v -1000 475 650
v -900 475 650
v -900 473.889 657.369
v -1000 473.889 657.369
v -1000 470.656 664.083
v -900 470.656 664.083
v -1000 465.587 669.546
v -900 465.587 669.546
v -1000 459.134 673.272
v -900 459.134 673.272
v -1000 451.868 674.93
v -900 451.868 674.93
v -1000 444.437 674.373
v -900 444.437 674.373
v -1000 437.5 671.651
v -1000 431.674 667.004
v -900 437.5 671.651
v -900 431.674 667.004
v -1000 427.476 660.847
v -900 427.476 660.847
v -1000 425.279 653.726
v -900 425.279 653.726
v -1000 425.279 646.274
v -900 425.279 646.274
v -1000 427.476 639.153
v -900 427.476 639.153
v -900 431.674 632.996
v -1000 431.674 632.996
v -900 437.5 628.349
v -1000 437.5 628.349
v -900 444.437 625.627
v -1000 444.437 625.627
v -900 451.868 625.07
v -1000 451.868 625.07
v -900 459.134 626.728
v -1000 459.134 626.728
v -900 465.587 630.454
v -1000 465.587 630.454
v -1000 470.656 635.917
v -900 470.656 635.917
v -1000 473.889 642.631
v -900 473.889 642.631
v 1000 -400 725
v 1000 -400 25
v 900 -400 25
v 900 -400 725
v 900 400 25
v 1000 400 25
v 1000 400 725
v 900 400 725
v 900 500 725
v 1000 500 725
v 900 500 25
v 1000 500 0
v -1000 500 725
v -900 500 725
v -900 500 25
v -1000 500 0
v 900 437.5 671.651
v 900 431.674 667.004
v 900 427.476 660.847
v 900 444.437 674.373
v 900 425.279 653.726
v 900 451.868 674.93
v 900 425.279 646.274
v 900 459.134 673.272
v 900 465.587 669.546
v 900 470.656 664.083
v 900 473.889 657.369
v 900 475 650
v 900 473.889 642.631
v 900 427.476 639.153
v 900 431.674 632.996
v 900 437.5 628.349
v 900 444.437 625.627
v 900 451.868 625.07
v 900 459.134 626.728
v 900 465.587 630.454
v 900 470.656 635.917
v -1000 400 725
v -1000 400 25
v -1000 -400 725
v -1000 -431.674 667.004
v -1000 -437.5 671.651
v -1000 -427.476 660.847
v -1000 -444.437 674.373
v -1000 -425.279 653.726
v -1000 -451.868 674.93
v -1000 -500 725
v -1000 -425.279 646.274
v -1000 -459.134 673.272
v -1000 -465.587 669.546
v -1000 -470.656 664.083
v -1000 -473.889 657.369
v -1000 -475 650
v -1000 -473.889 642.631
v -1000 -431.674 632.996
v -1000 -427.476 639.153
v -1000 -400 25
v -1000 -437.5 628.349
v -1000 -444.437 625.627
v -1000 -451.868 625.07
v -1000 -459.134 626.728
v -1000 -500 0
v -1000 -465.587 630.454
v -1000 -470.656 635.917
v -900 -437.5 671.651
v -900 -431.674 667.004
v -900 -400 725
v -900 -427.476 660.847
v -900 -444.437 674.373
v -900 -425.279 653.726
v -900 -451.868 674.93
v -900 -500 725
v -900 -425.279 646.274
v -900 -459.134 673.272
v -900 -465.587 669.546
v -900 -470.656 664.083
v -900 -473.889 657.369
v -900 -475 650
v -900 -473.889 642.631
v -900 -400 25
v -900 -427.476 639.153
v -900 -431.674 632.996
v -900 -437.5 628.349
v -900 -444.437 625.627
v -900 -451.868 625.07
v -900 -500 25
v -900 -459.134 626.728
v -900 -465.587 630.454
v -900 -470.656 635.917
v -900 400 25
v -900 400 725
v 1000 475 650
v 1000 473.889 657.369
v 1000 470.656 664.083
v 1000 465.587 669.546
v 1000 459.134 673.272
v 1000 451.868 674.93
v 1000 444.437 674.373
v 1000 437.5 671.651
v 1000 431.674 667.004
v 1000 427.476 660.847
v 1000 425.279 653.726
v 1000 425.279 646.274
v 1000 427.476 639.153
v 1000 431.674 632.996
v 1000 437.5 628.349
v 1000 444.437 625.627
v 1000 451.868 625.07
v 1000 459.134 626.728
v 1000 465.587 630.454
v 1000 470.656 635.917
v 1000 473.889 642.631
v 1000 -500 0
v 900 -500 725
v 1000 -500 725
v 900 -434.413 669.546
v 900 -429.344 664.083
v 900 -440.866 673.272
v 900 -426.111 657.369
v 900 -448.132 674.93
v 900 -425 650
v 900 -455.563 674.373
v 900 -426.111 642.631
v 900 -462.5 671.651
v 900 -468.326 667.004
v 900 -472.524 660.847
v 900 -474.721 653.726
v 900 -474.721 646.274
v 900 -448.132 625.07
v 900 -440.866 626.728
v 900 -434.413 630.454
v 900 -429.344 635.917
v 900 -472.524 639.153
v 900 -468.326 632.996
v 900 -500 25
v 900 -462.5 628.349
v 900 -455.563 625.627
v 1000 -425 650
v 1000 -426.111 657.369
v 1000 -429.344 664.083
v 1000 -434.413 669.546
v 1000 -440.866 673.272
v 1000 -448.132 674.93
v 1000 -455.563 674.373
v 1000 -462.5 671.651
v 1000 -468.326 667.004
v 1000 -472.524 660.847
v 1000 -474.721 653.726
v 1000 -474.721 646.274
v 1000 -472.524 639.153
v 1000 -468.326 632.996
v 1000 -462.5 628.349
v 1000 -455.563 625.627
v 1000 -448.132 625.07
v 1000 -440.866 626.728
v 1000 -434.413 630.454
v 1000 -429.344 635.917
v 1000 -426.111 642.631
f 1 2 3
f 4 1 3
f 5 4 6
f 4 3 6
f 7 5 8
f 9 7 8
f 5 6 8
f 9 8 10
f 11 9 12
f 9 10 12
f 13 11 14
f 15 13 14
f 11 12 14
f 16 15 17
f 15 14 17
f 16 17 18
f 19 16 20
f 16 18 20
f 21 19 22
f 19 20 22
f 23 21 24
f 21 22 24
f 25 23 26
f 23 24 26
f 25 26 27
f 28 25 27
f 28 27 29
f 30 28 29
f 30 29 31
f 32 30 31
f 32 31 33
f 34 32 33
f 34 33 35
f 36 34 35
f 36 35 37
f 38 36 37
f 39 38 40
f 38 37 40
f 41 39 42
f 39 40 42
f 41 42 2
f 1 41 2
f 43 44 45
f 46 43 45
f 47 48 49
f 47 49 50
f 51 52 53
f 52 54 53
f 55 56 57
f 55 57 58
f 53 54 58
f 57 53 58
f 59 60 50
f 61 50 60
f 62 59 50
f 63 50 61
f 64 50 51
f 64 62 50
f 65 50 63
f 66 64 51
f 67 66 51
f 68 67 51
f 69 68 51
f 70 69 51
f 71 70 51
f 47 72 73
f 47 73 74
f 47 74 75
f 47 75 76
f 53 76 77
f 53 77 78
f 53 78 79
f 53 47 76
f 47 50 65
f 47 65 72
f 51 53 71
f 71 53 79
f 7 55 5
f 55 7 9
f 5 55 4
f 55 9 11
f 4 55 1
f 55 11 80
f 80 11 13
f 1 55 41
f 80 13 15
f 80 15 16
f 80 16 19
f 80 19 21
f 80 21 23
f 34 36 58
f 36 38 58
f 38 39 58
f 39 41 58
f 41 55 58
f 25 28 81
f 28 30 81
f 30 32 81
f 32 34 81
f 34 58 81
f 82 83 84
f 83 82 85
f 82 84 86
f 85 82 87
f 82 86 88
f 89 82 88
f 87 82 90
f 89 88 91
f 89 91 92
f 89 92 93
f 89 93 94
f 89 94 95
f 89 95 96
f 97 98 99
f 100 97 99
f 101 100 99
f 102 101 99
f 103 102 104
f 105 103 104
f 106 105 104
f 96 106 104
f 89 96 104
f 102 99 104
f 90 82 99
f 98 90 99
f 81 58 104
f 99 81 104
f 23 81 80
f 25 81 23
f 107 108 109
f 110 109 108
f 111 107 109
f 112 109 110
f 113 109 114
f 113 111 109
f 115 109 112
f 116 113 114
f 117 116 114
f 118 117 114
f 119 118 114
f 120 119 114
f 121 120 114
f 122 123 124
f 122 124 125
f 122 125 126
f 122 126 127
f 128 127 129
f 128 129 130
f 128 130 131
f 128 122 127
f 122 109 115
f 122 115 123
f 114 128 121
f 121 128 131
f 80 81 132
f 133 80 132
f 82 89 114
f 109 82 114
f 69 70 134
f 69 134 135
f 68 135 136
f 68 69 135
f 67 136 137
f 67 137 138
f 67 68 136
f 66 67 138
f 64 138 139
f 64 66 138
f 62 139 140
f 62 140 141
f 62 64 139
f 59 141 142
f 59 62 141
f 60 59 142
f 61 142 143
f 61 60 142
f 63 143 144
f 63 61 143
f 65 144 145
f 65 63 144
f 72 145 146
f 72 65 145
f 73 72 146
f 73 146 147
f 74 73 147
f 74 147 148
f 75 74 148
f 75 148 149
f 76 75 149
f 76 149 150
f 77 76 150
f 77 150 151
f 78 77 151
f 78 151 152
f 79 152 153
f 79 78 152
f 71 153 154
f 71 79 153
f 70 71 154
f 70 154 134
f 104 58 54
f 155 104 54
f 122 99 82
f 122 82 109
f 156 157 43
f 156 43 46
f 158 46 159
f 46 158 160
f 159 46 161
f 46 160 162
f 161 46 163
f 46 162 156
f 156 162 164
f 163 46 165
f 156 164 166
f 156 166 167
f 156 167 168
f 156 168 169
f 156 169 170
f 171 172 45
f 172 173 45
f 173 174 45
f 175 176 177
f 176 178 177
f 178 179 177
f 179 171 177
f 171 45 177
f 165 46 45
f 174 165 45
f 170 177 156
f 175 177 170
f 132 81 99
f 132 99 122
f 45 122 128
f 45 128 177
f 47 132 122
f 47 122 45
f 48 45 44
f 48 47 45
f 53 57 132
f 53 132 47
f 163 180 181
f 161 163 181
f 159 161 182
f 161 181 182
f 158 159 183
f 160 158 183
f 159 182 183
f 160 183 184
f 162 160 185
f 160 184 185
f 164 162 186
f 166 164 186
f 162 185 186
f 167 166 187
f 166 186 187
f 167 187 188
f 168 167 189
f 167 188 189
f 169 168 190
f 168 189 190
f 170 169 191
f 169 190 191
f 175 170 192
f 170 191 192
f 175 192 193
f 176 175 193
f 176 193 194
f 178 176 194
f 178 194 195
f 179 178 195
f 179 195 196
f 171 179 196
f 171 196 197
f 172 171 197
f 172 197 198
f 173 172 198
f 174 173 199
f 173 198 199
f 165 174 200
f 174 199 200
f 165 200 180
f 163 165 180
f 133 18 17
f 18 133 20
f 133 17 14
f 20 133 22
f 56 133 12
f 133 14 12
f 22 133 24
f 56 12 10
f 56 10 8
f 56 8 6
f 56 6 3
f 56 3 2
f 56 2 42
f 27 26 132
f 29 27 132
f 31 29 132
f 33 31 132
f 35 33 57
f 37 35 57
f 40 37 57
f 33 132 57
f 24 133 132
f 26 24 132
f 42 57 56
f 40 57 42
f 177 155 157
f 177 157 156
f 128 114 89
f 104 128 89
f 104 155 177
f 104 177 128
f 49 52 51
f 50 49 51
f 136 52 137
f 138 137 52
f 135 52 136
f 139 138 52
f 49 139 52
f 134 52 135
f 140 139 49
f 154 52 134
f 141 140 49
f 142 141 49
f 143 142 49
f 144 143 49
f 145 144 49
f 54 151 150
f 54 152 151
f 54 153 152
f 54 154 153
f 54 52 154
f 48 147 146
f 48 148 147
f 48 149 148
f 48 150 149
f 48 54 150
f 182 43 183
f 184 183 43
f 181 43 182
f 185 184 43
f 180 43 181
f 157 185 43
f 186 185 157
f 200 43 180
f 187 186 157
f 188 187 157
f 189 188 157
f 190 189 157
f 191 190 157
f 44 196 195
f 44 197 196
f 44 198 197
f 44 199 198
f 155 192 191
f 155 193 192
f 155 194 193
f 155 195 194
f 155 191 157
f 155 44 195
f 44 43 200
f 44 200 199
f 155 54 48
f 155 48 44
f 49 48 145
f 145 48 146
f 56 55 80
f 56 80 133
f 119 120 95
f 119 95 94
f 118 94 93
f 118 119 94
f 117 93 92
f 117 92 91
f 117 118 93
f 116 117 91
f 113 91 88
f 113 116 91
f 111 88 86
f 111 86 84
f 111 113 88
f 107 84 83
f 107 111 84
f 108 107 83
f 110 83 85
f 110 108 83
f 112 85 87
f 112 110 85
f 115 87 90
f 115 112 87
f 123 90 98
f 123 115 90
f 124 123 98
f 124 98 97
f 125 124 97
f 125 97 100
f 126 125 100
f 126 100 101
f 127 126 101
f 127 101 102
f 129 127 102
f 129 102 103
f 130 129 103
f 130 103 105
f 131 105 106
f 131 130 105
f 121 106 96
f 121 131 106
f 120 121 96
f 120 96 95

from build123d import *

# Parameters (mm, degrees)
F2_W             = 2000
F2_H             = 1000
F3_DEPTH         = 25
F4_W             = 100
F4_H             = 100
F5_DEPTH         = 700
F5_COPIES2_COUNT = 2
F6_R             = 25
F7_DEPTH         = 100
F7_COPIES2_COUNT = 2
F7_COPIES2_PITCH = 2102.379604


# Not quite as in the source:
# - a pattern or mirror of a feature is missing from the dataset's text; its kind, count and spacing are read off the source's solid


with BuildPart() as f3:
    # F2 (on Top) → F3 (new body)
    with BuildSketch(Plane.XY):
        Rectangle(F2_W, F2_H)
    extrude(amount=F3_DEPTH)

    # F4 (on face) → F5 (join)
    with BuildSketch(Plane.XY.offset(25)):
        with Locations((-950, 450)):
            Rectangle(F4_W, F4_H)
    f5 = extrude(amount=F5_DEPTH)

    # F5_copies: F5 across plane
    add(f5.mirror(Plane(origin=(0, 0, 0), x_dir=(0, 0, 1), z_dir=(1, 0, 0))))

    # F5_copies1: F5 across plane
    add(f5.mirror(Plane(origin=(0, 0, 0), x_dir=(0, 0, -1), z_dir=(0, -1, 0))))

    # F5_copies2: F5 ×2 about axis
    f5_copies2_axis = Axis((0, 0, 0), (0, 0, 1))
    for i in range(1, F5_COPIES2_COUNT):
        add(f5.rotate(f5_copies2_axis, i * 360 / F5_COPIES2_COUNT))

    # F6 (on face) → F7 (cut, through all)
    with BuildSketch(Plane.YZ.offset(-900)):
        with Locations((450, 650)):
            Circle(F6_R)
    f7 = extrude(amount=-F7_DEPTH, mode=Mode.SUBTRACT)

    # F7_copies: F7 across plane
    add(f7.mirror(Plane(origin=(0, 0, 0), x_dir=(0, 0, 1), z_dir=(1, 0, 0))), mode=Mode.SUBTRACT)

    # F7_copies1: F7 across plane
    add(f7.mirror(Plane(origin=(0, 0, 0), x_dir=(0, 0, -1), z_dir=(0, -1, 0))), mode=Mode.SUBTRACT)

    # F7_copies2: F7 ×2
    with Locations(*[Vector(0.9037378389, -0.4280863447, 0) * (i * F7_COPIES2_PITCH) for i in range(1, F7_COPIES2_COUNT)]):
        add(f7, mode=Mode.SUBTRACT)


solid = f3.part
